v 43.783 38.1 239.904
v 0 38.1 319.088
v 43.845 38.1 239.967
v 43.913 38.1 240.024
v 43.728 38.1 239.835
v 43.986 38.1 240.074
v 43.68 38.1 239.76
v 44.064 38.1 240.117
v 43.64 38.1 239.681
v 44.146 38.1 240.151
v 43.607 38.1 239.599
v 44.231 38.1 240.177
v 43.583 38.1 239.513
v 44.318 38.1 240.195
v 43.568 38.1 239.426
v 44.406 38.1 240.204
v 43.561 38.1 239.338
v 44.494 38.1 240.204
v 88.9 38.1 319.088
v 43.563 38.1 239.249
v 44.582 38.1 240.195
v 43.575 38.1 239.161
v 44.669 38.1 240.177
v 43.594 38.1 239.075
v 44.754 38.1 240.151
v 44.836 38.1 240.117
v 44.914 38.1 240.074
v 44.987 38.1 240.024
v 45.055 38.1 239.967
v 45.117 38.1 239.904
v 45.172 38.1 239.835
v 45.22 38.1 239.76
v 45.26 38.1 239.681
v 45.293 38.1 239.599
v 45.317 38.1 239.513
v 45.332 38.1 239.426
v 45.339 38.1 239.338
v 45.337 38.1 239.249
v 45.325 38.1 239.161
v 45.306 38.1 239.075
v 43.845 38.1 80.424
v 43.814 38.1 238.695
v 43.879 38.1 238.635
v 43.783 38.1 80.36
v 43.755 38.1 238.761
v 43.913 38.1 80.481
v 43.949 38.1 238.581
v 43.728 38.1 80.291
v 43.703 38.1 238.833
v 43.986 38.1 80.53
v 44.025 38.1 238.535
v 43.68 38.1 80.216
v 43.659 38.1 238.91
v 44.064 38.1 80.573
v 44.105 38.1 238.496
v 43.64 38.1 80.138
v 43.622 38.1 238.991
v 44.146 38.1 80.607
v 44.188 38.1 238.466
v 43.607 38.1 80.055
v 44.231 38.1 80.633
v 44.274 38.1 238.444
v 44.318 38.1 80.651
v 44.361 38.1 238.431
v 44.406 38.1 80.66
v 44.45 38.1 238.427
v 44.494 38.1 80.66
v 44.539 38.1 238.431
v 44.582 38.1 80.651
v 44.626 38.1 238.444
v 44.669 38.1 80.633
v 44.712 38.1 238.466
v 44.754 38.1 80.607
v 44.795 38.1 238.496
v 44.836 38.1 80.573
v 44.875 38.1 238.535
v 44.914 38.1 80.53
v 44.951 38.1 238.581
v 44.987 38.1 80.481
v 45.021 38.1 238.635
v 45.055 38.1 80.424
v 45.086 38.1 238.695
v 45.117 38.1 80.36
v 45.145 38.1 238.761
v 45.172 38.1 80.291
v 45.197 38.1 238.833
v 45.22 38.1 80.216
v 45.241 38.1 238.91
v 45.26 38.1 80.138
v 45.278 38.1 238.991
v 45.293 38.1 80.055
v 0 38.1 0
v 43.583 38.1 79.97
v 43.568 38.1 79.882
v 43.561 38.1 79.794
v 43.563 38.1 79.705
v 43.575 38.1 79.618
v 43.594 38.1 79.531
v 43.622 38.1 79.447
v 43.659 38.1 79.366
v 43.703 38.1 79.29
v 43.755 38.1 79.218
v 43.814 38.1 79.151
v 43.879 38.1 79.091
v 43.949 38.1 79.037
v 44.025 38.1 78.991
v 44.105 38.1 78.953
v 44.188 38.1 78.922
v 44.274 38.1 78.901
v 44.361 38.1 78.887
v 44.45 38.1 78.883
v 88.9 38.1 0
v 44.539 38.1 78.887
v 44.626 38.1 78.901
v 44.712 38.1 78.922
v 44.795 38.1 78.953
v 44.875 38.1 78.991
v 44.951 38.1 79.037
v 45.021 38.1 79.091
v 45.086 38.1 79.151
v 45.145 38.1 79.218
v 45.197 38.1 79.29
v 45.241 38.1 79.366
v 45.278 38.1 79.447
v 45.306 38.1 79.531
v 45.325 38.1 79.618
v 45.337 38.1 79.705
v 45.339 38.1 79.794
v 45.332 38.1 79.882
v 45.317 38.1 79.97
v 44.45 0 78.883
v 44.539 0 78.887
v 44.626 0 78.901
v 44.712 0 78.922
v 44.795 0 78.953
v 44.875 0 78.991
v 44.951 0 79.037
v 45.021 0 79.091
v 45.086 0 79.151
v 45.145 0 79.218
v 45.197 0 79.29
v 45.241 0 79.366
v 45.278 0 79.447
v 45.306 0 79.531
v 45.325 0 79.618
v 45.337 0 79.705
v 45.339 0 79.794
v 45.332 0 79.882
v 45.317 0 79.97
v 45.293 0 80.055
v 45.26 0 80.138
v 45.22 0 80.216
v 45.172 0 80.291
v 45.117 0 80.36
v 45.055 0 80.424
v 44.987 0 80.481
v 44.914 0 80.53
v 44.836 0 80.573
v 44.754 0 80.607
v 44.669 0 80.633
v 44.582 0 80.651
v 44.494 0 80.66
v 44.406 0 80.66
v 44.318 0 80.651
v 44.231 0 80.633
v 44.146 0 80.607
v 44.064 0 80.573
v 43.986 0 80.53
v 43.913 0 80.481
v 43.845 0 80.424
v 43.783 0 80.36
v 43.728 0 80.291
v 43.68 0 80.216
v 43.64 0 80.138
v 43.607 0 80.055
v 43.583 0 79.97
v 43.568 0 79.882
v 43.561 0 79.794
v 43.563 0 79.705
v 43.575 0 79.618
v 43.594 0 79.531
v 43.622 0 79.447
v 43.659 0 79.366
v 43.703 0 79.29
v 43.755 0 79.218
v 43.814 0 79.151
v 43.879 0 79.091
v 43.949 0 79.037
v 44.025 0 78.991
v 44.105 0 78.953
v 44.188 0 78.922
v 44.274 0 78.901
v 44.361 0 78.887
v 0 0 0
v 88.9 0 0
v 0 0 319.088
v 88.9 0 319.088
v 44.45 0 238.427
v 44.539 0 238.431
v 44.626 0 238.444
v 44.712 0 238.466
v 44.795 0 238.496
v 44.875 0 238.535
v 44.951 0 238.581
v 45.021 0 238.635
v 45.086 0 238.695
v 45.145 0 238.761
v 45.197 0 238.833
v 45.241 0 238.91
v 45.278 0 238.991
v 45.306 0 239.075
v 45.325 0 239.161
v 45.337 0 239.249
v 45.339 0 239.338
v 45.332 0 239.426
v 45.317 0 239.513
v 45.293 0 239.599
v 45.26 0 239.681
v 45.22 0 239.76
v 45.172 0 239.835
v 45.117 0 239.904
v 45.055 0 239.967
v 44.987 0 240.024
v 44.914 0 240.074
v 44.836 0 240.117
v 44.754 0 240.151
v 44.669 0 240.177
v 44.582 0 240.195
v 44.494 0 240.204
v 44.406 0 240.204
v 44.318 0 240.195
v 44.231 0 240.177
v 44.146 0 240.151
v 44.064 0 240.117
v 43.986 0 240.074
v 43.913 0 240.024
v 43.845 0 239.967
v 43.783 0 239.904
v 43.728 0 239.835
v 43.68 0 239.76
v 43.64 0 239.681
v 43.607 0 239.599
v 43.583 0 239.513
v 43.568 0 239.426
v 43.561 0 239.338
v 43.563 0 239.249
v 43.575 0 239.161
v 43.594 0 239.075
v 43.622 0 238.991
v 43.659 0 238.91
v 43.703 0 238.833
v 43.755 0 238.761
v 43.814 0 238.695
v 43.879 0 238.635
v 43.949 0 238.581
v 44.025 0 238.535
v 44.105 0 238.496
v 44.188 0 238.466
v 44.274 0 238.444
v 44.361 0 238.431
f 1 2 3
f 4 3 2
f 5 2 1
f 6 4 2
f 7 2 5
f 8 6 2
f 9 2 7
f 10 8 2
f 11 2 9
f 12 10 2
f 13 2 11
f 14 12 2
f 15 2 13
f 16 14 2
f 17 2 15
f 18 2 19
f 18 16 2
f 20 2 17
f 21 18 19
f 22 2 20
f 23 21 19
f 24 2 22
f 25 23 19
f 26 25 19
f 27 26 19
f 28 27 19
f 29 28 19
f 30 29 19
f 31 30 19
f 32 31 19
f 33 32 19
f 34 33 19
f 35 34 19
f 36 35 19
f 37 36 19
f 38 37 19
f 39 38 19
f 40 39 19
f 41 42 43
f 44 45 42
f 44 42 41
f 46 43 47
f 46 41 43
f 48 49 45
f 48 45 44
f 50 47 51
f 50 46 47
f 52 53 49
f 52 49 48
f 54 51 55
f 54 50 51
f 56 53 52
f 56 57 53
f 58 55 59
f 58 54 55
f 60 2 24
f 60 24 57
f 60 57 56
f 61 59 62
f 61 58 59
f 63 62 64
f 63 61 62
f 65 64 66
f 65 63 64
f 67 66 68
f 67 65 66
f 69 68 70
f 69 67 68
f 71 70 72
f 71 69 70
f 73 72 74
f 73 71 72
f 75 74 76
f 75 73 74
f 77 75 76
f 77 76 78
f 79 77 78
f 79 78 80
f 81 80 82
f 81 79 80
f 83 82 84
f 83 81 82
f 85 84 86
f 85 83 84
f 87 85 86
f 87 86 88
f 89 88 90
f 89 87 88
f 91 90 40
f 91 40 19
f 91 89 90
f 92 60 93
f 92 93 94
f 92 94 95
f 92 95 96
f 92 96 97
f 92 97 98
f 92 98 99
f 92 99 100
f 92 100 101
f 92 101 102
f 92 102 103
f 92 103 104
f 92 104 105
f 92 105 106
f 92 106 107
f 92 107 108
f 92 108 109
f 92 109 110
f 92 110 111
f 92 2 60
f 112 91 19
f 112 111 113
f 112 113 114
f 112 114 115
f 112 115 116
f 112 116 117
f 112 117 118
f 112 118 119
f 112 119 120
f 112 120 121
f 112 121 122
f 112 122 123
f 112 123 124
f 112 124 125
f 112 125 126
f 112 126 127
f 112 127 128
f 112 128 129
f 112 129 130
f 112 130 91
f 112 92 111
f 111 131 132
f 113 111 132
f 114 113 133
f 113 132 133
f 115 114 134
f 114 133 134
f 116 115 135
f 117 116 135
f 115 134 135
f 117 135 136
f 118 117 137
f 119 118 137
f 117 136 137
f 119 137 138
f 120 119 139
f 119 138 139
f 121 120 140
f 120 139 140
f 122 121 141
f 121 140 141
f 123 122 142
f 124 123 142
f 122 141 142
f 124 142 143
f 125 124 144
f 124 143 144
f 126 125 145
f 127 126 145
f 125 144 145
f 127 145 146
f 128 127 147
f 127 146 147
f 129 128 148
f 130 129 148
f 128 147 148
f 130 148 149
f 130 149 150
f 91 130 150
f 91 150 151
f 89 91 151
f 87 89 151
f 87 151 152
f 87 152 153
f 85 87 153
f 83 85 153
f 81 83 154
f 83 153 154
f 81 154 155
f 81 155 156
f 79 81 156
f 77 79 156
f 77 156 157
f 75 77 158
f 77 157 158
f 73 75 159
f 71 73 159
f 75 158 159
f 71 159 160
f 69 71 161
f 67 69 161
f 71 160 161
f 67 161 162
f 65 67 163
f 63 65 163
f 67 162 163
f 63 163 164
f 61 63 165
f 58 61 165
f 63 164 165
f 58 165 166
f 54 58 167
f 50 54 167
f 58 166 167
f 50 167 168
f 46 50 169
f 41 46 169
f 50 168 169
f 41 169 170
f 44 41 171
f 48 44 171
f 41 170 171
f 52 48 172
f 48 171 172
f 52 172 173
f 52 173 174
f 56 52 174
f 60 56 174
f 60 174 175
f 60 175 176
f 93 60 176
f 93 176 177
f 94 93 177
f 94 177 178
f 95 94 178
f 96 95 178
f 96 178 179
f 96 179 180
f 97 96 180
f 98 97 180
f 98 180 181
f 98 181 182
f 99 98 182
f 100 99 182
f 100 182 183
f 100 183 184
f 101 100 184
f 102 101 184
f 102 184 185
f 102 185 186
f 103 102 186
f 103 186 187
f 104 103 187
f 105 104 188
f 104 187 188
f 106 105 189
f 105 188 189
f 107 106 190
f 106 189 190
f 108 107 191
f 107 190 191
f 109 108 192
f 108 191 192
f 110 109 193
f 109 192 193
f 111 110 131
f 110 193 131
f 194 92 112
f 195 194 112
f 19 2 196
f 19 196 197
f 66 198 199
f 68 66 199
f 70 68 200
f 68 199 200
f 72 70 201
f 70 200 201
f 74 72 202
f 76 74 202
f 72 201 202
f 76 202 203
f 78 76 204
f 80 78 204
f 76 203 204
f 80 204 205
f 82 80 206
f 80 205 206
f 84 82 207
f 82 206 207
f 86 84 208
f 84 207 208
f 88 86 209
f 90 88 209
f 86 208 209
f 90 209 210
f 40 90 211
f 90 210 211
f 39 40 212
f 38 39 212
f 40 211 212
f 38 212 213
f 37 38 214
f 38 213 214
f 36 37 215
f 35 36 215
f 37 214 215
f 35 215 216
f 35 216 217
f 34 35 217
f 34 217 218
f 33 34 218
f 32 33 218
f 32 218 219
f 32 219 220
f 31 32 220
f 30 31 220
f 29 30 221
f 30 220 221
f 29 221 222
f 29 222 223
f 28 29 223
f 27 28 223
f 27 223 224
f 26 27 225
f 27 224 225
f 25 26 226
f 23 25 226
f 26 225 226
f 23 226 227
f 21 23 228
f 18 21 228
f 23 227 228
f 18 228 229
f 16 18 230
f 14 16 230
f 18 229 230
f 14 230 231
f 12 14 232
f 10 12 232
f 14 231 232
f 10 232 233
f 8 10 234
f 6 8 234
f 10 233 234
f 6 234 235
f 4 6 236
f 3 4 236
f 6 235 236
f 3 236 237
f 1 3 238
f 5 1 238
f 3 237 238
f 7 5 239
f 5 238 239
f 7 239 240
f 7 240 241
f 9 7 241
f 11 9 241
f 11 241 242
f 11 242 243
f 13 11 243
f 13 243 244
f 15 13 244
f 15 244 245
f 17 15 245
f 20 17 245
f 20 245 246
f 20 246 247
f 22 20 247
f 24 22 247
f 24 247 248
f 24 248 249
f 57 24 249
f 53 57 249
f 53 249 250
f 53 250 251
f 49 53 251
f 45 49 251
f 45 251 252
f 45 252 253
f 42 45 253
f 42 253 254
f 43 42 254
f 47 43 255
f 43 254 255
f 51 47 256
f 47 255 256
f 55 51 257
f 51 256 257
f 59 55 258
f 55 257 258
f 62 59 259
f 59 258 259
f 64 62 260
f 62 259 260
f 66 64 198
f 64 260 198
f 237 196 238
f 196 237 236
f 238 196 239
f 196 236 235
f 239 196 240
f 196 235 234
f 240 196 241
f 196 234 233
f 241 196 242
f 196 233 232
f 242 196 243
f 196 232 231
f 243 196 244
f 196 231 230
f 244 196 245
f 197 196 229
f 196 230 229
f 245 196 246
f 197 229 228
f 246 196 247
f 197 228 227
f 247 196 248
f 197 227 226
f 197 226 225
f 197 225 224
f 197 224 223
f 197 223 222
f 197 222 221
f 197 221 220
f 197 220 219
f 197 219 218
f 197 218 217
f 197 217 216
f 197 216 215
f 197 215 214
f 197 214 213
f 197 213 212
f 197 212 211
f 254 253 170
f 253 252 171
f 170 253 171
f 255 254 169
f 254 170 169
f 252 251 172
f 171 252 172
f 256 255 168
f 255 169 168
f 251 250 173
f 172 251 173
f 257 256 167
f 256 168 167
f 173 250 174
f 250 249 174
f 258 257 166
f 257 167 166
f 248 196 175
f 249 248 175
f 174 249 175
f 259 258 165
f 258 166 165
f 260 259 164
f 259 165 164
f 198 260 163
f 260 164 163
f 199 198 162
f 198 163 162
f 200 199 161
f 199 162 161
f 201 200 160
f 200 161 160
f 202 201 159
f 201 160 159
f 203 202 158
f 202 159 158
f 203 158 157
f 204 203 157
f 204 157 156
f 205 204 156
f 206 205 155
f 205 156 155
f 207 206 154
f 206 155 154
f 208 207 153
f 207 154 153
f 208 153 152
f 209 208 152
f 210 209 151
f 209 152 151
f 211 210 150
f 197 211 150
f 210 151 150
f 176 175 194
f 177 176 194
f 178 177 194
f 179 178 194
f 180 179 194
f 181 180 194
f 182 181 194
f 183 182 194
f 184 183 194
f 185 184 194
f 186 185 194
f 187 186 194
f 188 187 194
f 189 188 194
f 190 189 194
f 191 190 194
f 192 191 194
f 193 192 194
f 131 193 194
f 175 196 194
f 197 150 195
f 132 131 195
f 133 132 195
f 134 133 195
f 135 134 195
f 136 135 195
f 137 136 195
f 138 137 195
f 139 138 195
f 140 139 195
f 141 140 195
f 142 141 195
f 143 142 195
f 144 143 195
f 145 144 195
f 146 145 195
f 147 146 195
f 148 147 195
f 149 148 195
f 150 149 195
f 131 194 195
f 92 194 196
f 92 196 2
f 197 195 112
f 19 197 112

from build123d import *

# Parameters (mm, degrees)
SKETCH1_W           = 88.9
SKETCH1_H           = 38.1
BOSS_EXTRUDE1_DEPTH = 319.0875
SKETCH2_R           = 0.889
CUT_EXTRUDE1_DEPTH  = 38.1


with BuildPart() as part:
    # Sketch1 → Boss-Extrude1 (new body)
    with BuildSketch(Plane.XY):
        with Locations((44.45, 19.05)):
            Rectangle(SKETCH1_W, SKETCH1_H)
    extrude(amount=BOSS_EXTRUDE1_DEPTH)

    # Sketch2 → Cut-Extrude1 (cut)
    with BuildSketch(Plane.XZ):
        with Locations(Location((44.45, 79.771875, 0), (0, 0, 270))):
            Circle(SKETCH2_R)
        with Locations(Location((44.45, 239.315625, 0), (0, 0, 270))):
            Circle(SKETCH2_R)
    extrude(amount=-CUT_EXTRUDE1_DEPTH, mode=Mode.SUBTRACT)


solid = part.part
